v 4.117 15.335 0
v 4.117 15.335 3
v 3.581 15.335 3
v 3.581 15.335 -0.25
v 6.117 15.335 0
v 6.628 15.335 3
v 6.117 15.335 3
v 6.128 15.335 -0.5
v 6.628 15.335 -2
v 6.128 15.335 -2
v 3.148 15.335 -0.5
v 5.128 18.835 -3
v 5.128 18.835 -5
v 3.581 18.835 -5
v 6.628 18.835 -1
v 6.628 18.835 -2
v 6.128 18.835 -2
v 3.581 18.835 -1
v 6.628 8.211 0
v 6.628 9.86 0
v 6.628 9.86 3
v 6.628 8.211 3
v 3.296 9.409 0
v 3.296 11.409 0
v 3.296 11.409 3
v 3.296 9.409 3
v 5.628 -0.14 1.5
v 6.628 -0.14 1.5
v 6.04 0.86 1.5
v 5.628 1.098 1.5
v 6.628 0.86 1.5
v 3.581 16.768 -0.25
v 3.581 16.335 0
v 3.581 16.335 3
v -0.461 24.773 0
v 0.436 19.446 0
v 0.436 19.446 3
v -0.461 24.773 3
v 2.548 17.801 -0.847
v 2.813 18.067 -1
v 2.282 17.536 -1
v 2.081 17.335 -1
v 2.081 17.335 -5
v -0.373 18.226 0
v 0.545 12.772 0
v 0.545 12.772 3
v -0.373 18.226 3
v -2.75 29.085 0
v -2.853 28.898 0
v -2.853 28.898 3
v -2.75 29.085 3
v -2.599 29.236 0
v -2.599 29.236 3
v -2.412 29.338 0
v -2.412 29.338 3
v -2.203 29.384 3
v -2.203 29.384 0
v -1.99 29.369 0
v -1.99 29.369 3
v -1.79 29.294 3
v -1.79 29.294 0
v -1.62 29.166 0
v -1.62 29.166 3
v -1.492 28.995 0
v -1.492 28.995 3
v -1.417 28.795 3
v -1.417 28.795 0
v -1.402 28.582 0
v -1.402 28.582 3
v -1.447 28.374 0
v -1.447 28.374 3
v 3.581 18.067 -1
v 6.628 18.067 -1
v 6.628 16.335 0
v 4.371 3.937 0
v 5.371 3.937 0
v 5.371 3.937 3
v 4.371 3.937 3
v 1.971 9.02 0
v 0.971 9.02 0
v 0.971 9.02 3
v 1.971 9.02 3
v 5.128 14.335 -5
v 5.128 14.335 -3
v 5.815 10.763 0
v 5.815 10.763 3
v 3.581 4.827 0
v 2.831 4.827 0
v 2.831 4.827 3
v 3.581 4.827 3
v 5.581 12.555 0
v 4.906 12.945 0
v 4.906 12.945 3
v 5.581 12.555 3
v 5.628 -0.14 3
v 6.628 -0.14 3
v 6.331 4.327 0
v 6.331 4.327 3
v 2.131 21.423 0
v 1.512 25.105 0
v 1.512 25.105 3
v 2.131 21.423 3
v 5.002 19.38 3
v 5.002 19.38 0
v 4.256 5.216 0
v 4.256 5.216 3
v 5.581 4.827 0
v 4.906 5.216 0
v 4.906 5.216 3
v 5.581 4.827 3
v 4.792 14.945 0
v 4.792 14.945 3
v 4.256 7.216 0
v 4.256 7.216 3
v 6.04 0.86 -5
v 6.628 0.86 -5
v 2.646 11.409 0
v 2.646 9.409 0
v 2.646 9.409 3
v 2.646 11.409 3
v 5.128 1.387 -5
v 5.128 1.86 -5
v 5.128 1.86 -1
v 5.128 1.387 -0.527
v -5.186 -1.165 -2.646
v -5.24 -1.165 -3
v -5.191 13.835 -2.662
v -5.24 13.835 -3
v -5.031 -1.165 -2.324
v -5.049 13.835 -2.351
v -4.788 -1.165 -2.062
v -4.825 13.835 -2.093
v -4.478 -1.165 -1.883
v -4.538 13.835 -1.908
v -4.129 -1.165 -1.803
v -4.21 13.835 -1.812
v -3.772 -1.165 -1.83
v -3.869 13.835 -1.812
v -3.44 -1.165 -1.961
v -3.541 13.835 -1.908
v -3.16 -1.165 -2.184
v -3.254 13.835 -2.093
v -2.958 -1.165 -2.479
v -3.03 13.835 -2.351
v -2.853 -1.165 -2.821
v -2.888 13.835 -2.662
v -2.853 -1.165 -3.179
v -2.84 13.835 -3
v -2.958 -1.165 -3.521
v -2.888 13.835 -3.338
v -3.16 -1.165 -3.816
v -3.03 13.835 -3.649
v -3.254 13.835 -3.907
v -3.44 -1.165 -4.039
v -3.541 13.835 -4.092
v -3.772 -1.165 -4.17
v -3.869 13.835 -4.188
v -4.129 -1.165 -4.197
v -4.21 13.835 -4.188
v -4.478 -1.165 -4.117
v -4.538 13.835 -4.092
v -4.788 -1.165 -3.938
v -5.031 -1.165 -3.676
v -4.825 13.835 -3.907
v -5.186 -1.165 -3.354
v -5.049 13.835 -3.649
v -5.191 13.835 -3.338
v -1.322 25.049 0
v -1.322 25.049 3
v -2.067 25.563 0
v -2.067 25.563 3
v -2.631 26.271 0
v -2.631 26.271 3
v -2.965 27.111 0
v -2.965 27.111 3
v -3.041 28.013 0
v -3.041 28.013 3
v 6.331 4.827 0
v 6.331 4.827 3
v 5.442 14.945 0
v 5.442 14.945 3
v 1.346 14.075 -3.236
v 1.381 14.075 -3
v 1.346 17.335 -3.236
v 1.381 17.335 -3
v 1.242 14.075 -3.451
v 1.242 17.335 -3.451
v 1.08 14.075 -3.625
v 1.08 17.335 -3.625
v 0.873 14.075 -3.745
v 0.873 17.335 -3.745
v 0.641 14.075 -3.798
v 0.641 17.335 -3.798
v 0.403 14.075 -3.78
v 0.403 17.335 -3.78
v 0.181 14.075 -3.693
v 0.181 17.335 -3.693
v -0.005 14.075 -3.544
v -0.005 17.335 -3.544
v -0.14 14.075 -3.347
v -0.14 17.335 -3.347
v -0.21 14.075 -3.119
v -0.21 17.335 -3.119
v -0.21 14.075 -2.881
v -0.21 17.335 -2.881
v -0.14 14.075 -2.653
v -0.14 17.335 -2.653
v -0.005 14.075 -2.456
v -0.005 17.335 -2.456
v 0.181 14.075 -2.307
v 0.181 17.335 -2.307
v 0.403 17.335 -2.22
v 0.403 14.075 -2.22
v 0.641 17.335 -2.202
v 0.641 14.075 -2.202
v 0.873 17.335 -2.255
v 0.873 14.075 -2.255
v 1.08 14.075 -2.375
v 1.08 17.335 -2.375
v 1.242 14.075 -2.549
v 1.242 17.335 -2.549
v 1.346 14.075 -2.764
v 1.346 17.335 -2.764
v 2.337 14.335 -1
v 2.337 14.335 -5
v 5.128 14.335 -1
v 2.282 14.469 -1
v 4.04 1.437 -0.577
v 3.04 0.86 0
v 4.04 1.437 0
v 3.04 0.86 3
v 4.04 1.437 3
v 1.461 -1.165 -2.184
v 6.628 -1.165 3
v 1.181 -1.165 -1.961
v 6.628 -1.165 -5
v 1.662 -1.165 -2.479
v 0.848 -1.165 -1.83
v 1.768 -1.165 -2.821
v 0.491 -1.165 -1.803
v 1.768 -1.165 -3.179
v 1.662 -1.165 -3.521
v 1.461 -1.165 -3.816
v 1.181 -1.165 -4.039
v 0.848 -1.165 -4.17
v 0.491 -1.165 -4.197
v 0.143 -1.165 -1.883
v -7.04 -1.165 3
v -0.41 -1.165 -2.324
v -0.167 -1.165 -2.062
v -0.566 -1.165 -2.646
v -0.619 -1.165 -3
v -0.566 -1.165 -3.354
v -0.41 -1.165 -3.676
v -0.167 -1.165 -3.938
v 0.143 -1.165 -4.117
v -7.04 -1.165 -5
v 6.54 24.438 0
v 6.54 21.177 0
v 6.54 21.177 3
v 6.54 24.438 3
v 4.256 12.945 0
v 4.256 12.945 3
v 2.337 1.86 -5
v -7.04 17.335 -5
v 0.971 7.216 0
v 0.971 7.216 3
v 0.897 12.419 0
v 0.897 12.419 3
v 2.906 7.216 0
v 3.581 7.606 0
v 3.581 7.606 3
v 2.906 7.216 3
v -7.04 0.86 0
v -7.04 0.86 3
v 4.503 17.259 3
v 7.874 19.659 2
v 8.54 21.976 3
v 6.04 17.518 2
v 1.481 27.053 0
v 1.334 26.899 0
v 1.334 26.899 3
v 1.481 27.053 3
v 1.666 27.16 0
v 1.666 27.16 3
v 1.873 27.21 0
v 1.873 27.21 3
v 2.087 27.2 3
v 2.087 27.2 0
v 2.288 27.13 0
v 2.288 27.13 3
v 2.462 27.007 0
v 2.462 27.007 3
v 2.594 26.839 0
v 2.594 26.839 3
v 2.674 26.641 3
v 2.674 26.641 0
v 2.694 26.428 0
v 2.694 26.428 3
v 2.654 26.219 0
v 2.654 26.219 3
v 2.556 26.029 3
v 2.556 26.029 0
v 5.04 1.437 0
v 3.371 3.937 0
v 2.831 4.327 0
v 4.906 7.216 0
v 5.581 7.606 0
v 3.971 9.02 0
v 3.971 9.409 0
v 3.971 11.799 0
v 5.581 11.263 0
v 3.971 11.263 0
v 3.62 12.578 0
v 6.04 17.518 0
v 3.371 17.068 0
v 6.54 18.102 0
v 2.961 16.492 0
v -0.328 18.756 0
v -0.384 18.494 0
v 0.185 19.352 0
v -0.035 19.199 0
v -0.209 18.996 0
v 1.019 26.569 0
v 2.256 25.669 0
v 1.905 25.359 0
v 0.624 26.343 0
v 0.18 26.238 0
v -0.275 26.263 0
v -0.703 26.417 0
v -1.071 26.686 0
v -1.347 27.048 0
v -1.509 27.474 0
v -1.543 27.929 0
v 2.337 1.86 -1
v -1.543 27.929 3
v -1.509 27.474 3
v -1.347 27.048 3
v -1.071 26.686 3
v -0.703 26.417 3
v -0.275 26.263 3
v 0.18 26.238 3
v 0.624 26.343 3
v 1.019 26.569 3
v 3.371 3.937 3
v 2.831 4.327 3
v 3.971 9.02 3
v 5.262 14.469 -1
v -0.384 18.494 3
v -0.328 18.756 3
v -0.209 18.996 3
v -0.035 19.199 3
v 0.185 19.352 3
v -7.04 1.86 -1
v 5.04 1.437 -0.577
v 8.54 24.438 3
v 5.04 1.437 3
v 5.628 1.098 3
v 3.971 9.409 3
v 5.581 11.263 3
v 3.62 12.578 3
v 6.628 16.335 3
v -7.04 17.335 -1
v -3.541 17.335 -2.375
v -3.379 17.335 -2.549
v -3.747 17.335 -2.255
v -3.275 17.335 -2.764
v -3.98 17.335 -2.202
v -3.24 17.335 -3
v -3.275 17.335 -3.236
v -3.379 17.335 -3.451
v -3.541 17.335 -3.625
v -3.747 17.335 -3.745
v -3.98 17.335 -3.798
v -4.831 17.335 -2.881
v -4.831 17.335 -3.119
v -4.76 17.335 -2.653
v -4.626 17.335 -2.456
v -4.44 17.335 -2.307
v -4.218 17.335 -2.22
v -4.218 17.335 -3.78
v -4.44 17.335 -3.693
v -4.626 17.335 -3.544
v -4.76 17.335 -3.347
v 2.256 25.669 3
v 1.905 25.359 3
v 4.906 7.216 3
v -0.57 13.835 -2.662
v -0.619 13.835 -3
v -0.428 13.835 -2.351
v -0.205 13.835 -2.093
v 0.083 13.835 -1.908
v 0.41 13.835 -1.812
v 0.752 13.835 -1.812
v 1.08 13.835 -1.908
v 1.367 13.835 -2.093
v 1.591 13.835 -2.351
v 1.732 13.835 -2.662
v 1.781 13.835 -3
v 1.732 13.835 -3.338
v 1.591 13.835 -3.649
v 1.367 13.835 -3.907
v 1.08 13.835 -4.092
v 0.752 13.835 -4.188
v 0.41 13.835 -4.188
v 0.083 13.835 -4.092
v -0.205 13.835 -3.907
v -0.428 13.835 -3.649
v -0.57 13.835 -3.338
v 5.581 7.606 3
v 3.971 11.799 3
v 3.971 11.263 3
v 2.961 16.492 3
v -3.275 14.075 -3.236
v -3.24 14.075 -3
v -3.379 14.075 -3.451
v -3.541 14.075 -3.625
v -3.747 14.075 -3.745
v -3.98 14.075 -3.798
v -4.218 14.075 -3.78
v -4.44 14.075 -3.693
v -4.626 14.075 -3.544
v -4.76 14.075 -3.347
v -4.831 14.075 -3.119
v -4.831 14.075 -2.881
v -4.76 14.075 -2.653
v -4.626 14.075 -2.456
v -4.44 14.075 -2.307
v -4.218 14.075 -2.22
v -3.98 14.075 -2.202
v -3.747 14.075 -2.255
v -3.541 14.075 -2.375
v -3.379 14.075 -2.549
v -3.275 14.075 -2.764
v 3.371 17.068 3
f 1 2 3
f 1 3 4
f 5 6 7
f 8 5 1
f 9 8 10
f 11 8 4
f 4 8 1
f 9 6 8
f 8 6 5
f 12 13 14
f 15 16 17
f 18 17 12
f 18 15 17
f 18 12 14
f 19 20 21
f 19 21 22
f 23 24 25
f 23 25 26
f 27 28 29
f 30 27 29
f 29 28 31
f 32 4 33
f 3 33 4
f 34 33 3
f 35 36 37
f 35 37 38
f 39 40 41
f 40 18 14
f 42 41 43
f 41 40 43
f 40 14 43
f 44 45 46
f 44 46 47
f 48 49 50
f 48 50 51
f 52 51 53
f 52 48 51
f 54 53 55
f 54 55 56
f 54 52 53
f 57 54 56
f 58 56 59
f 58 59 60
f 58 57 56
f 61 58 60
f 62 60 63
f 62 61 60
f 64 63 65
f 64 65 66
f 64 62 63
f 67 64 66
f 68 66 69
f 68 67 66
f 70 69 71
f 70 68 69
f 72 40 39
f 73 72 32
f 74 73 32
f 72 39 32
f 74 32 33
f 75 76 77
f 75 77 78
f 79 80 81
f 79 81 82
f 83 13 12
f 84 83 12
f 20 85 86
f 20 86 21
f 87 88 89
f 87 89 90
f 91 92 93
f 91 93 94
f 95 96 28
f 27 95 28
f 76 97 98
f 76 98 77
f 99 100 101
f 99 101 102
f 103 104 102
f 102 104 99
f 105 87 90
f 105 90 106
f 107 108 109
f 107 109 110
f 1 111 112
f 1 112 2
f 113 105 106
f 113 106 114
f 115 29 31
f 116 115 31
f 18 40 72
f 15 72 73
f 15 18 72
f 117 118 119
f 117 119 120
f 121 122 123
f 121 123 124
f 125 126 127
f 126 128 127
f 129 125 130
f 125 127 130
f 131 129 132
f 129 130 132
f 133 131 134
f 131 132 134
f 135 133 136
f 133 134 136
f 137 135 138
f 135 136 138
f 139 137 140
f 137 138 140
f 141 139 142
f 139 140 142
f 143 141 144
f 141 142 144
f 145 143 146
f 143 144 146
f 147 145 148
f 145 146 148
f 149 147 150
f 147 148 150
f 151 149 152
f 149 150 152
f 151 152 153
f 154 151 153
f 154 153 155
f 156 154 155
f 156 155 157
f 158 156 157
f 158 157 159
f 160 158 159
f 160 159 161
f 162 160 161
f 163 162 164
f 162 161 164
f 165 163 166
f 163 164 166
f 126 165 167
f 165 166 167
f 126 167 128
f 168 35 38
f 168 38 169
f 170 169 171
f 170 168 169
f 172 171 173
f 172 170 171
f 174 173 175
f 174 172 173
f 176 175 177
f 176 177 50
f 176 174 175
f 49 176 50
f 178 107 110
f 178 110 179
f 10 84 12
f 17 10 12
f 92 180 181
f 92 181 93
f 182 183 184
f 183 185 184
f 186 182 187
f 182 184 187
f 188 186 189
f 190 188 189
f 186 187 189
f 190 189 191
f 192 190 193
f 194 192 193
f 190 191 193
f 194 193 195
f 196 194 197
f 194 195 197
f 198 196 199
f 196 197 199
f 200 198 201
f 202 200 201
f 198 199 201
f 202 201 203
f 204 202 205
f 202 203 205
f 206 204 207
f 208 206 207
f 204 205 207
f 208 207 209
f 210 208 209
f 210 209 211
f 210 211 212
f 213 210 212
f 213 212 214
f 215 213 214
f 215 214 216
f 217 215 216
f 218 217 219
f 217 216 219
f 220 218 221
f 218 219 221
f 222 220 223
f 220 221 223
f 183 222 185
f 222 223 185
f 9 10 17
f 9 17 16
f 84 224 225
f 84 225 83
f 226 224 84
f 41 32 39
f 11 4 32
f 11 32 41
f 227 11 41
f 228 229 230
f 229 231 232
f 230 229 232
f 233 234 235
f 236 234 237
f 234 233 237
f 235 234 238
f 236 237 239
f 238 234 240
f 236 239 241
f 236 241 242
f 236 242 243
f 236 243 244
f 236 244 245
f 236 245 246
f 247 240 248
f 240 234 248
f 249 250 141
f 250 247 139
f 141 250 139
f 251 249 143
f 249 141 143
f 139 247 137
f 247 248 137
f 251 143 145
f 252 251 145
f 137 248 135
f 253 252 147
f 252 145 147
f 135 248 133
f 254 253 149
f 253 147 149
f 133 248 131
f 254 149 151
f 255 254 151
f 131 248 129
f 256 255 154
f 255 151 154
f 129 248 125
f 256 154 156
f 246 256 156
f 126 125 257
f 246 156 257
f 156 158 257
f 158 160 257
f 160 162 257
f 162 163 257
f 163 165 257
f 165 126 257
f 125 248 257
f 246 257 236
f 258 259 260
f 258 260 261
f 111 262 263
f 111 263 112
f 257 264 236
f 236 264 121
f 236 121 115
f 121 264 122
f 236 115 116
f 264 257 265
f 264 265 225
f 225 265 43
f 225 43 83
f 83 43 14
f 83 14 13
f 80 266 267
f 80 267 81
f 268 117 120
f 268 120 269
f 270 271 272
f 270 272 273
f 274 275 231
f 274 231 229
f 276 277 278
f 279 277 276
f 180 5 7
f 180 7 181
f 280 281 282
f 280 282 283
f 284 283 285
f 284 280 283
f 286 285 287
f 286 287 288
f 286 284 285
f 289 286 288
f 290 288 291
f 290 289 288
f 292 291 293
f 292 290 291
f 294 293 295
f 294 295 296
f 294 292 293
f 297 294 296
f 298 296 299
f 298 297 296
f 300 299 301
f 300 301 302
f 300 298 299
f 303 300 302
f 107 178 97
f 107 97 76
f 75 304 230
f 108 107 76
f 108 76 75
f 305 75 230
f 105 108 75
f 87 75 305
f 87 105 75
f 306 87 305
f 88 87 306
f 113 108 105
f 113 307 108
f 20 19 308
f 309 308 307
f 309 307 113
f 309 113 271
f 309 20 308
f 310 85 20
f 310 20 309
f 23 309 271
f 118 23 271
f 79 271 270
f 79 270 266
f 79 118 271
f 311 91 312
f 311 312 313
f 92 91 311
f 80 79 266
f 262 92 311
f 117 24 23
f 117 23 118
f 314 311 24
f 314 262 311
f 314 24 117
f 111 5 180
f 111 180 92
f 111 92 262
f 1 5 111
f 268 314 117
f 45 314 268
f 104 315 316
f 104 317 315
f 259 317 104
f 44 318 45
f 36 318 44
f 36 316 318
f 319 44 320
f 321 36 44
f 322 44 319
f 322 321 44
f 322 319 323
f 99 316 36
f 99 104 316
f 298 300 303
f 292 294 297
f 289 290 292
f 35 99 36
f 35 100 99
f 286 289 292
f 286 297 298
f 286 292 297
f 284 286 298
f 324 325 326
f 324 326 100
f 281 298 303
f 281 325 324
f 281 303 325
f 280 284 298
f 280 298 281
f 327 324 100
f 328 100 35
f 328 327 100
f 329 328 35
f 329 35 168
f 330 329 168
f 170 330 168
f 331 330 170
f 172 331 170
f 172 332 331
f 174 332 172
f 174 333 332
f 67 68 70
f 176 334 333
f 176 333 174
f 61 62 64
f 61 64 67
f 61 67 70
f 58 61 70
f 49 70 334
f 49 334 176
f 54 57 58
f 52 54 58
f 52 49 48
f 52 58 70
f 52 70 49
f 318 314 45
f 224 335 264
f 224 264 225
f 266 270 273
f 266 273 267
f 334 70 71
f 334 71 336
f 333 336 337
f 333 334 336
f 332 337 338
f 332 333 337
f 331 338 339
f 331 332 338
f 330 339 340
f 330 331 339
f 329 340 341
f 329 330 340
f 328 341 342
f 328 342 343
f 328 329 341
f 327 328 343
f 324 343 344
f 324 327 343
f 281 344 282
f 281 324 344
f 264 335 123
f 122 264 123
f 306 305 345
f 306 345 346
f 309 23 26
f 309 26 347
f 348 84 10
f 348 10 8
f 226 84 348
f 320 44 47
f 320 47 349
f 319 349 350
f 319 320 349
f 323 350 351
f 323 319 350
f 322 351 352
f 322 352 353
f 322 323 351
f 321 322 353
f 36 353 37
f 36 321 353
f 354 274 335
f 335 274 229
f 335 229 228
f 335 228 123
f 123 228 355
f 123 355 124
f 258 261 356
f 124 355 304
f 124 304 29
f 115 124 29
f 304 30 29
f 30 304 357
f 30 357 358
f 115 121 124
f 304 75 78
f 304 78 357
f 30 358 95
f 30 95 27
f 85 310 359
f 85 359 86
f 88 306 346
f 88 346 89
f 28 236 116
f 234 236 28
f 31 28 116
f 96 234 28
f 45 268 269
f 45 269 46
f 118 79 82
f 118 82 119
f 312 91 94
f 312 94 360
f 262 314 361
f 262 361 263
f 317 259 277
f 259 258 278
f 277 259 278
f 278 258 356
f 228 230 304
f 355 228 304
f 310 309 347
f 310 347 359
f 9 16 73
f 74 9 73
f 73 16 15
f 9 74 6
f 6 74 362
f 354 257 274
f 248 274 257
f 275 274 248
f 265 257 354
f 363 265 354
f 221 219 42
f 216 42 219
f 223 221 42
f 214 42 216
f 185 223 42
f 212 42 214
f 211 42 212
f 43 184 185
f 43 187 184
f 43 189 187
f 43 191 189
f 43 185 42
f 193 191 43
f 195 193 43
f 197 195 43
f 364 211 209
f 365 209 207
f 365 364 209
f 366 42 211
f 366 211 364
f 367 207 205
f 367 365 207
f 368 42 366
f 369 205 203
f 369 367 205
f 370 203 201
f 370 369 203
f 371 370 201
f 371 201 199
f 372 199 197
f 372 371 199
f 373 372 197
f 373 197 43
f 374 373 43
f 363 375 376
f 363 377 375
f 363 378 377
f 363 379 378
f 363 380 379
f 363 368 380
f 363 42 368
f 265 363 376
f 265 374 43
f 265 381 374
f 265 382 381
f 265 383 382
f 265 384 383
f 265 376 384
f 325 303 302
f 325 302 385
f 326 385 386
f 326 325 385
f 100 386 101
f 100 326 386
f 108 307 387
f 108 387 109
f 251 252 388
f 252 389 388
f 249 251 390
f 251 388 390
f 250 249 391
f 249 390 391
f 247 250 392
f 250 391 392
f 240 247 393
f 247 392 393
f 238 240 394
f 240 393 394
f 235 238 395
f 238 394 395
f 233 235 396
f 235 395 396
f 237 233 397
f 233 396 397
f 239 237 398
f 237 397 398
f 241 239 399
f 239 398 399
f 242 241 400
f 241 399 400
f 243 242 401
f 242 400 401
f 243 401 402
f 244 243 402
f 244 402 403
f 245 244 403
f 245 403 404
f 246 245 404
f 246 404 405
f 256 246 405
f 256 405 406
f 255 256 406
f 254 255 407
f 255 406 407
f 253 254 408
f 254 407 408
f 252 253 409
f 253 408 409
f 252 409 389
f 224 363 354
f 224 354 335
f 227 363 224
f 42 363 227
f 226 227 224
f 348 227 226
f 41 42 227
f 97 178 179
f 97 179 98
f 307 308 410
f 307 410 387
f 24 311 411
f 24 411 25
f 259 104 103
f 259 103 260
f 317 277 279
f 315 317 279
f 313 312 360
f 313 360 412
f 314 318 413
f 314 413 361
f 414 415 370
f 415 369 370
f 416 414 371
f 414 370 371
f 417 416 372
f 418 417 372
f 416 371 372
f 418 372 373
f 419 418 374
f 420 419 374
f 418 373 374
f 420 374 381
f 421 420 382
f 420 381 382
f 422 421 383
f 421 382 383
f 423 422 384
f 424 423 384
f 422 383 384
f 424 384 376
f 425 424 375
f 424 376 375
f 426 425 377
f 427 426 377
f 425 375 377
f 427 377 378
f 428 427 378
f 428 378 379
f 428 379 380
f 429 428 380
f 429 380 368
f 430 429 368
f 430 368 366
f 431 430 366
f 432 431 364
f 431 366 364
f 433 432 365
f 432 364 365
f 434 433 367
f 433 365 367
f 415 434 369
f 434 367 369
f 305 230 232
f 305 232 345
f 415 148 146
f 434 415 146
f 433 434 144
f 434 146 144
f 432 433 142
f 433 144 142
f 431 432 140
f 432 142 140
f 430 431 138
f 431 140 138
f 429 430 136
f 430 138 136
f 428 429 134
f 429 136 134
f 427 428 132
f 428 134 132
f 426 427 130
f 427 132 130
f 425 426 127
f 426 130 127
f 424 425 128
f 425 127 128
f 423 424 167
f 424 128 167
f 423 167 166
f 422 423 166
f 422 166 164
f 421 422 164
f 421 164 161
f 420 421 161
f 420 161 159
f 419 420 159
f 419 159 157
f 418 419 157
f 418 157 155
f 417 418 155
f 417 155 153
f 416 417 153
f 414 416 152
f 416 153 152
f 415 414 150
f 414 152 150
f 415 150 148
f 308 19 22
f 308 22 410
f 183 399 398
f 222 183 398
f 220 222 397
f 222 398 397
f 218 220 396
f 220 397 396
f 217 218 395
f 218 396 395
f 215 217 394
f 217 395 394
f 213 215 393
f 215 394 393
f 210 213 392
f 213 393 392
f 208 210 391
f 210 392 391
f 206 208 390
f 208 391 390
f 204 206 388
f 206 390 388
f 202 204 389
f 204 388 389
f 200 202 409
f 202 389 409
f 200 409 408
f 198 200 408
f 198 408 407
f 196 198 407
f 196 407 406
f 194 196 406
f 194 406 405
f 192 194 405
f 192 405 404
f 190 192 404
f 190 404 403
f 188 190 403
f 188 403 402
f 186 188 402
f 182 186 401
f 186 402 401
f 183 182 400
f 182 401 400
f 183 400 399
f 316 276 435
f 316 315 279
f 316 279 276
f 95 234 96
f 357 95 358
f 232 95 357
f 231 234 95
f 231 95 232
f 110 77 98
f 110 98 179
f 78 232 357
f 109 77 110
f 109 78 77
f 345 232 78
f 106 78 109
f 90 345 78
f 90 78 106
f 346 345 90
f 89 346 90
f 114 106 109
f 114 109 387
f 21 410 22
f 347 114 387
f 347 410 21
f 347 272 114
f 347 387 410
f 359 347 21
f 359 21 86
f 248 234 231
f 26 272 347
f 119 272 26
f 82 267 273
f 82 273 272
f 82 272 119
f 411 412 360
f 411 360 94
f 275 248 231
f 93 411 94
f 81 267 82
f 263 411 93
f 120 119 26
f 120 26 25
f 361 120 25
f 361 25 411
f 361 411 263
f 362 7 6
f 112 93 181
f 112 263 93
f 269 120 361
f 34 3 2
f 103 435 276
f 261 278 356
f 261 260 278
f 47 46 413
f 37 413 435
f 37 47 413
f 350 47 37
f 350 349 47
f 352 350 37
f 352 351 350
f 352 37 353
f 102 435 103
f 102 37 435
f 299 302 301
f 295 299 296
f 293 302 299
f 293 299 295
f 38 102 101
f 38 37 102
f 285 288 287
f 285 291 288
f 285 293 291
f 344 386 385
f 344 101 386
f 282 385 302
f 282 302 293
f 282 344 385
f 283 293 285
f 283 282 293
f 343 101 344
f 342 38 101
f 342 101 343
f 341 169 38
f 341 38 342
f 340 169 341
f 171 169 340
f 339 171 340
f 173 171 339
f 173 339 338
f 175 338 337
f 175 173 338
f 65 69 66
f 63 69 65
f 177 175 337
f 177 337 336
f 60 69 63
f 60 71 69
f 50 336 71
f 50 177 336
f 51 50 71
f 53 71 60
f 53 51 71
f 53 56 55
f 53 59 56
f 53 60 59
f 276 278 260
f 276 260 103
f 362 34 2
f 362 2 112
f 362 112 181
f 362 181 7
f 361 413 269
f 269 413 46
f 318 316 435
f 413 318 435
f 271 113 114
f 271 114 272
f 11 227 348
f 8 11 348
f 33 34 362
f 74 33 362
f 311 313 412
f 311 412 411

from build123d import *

# Parameters (mm, degrees)
BOSS_SWITCH_BODY_DEPTH                         = 3
SKETCH1_W                                      = 4
SKETCH1_H                                      = 3.5
BOSS_FLANGE_WIDTH_DEPTH                        = 5
BOSS_FLANGE_HEIGHT_REACH                       = 38.166
SKETCH2_W                                      = 4
SKETCH2_H                                      = 2
SKETCH2_W_2                                    = 8
SKETCH2_H_2                                    = 2.024978658
CUT_UP_TO_DOWN_DERAILLEUR_CLEARANCE_REACH      = 23.862
SKETCH10_W                                     = 2.453096586
SKETCH10_H                                     = 3
SKETCH17_W                                     = 12.1675
SKETCH17_H                                     = 4
BOSS_FLANGE_SUPPORT_DEPTH                      = 14.475021342
TAP_DRILL_FOR_M2X0_4_TAP1_D                    = 1.6
M2_CLEARANCE_HOLE2_D                           = 2.4
M2_CLEARANCE_HOLE2_DEPTH                       = 15
M2_CLEARANCE_HOLE2_TIP                         = 0.721032743
CUT_UP_TO_DOWN_CANTILEVER_SLOPE_REACH          = 31.347
CUT_DOWN_TO_UP_DERAILLEUR_CLEARANCE_DEPTH      = 33.698678667
CUT_DOWN_TO_UP_DERAILLEUR_CLEARANCE_DEPTH_BACK = 33.698678667
CHAMFER_FLANGE_SUPPORT_SIZE                    = 1.5
CHAMFER_FLANGE_SUPPORT_2_SIZE                  = 1
CHAMFER_FLANGE_SUPPORT_3_SIZE                  = 1
SKETCH18_W                                     = 1.5
SKETCH18_H                                     = 1.577331094
CUT_DOWN_TO_UP_DERAILLEUR_CLEARANCE_2_DEPTH    = 1
SKETCH19_W                                     = 3.046903414
SKETCH19_H                                     = 2.563581512
CUT_UP_TO_DOWN_CANTILEVER_CLEARANCE_DEPTH      = 1
CHAMFER1_SIZE                                  = 1
CHAMFER1_SIZE_2                                = 1.732050808
CHAMFER3_SIZE                                  = 0.75
CHAMFER3_SIZE_2                                = 1.299038106
CHAMFER4_SIZE                                  = 0.5
CHAMFER4_SIZE2                                 = 0.866025404
CHAMFER5_SIZE                                  = 0.5
CHAMFER6_SIZE                                  = 2.5
CHAMFER7_SIZE                                  = 1
CUT_EXTRUDE3_REACH                             = 33.008
SKETCH23_W                                     = 2.791062273
SKETCH23_H                                     = 12.475021342
CUT_GAP_FOR_PRINTING_DEPTH                     = 31.862053717


# Some blends are built 0.0001 mm under size
with BuildPart() as part:
    # Sketch-SwitchBossUp → Boss-Switch Body (new body)
    with BuildSketch(Plane.XY):
        with BuildLine():
            Line((6.540476927, 21.177422148), (6.540476927, 24.438379064))
            Line((6.540476927, 24.438379064), (8.540476927, 24.438379064))
            Line((8.540476927, 24.438379064), (8.540476927, 20.438379064))
            Line((8.540476927, 20.438379064), (6.040476927, 17.517528279))
            Line((6.040476927, 17.517528279), (2.878366495, 16.985217616))
            Line((2.878366495, 16.985217616), (3.620297651, 12.577888564))
            Line((3.620297651, 12.577888564), (4.256080915, 12.944958203))
            Line((4.256080915, 12.944958203), (4.791964496, 14.944962169))
            Line((4.791964496, 14.944962169), (4.116925685, 15.334689347))
            Line((4.116925685, 15.334689347), (3.581073513, 15.334689347))
            Line((3.581073513, 15.334689347), (3.581073513, 16.334689347))
            Line((3.581073513, 16.334689347), (6.857327822, 16.334689347))
            Line((6.857327822, 16.334689347), (13.441613484, 16.334689347))
            Line((13.441613484, 16.334689347), (13.441613484, -1.165310653))
            Line((13.441613484, -1.165310653), (5.040476927, -1.165310653))
            Line((5.040476927, -1.165310653), (3.040476927, -1.165310653))
            Line((3.040476927, -1.165310653), (3.040476927, 0.859668005))
            Line((3.040476927, 0.859668005), (4.040476927, 1.437018274))
            Line((4.040476927, 1.437018274), (3.370603946, 3.937018274))
            Line((3.370603946, 3.937018274), (2.83114552, 4.326720436))
            Line((2.83114552, 4.326720436), (2.83114552, 4.826720436))
            Line((2.83114552, 4.826720436), (3.58114552, 4.826720436))
            Line((3.58114552, 4.826720436), (4.256138119, 5.216427595))
            Line((4.256138119, 5.216427595), (4.256138119, 7.216427595))
            Line((4.256138119, 7.216427595), (3.581130717, 7.6061433))
            Line((3.581130717, 7.6061433), (2.9061262, 7.216422599))
            Line((2.9061262, 7.216422599), (0.971281627, 7.216422599))
            Line((0.971281627, 7.216422599), (0.971281627, 9.019692757))
            Line((0.971281627, 9.019692757), (1.971281627, 9.019692757))
            Line((1.971281627, 9.019692757), (2.646271341, 9.40939825))
            Line((2.646271341, 9.40939825), (2.646271341, 11.40939825))
            Line((2.646271341, 11.40939825), (0.897326855, 12.41915182))
            Line((0.897326855, 12.41915182), (0.545466745, 12.771663724))
            Line((0.545466745, 12.771663724), (-0.372784255, 18.226393961))
            ThreePointArc((-0.372784255, 18.226393961), (-0.209313172, 18.996084896), (0.435897335, 19.446473985))
            Line((0.435897335, 19.446473985), (-0.46073685, 24.772792819))
            ThreePointArc((-0.46073685, 24.772792819), (-2.630501593, 26.270619745), (-2.852546321, 28.897797067))
            ThreePointArc((-2.852546321, 28.897797067), (-1.887813913, 29.338582026), (-1.447028953, 28.373849618))
            ThreePointArc((-1.447028953, 28.373849618), (-0.703448682, 26.416936722), (1.333779254, 26.898727173))
            ThreePointArc((1.333779254, 26.898727173), (2.379722745, 27.074801628), (2.555797201, 26.028858137))
            ThreePointArc((2.555797201, 26.028858137), (2.086504637, 25.507104397), (1.511513111, 25.104801997))
            Line((1.511513111, 25.104801997), (2.546357317, 18.957467576))
            Line((2.546357317, 18.957467576), (4.992893704, 19.36931828))
            Line((4.992893704, 19.36931828), (6.540476927, 21.177422148))
        make_face()
        Polygon((5.581091201, 12.555245643), (5.581100766, 11.263016278), (3.971265023, 11.263016278), (3.97126394, 11.79911022), (3.296271341, 11.409403061), (3.296271341, 9.409403061), (3.971278743, 9.019687356), (3.971278743, 9.409408058), (5.815189335, 10.763016278), (6.627976927, 9.860324206), (6.627976927, 8.210536506), (5.581127833, 7.606137899), (4.906138119, 7.216432406), (4.906138119, 5.216432406), (5.58114552, 4.826716701), (6.33114552, 4.826716701), (6.33114552, 4.326716701), (5.370603946, 3.937018274), (4.370603946, 3.937018274), (5.040476927, 1.437018274), (6.040487998, 0.85968718), (9.127976927, 0.85968718), (10.437466736, 2.169176988), (10.437466736, 14.025199539), (9.127976927, 15.334689347), (6.116971898, 15.334689347), (5.441964496, 14.94496698), (4.906080915, 12.944963014), align=None, mode=Mode.SUBTRACT)
    extrude(amount=BOSS_SWITCH_BODY_DEPTH)

    # Sketch1 → Boss-Flange Width (add)
    with BuildSketch(Plane(origin=(0, 0, 0), x_dir=(-1, 0, 0), z_dir=(0, 0, -1))):
        Polygon((-7.581073513, -1.165310653), (0.412170615, -1.165310653), (0.412170615, 0.859668005), (-3.040476927, 0.859668005), (-4.040476927, 1.437018274), (-5.040476927, 1.437018274), (-6.040487998, 0.85968718), (-7.581073513, 0.85968718), align=None)
        with Locations((-5.581073513, 17.084689347)):
            Rectangle(SKETCH1_W, SKETCH1_H)
    extrude(amount=BOSS_FLANGE_WIDTH_DEPTH)

    # Sketch2 → Boss-Flange Height (add, up to next)
    with BuildSketch(Plane(origin=(-7.039523073, 0, 0), x_dir=(0, 0, -1), z_dir=(1, 0, 0)), mode=Mode.PRIVATE) as boss_flange_height_sk1:
        with Locations((3, 16.334689347)):
            Rectangle(SKETCH2_W, SKETCH2_H)
    boss_flange_height_tool1 = extrude(boss_flange_height_sk1.sketch, amount=BOSS_FLANGE_HEIGHT_REACH, mode=Mode.PRIVATE) - part.part
    # Sketch2 → Boss-Flange Height (add, up to next)
    with BuildSketch(Plane(origin=(-7.039523073, 0, 0), x_dir=(0, 0, -1), z_dir=(1, 0, 0)), mode=Mode.PRIVATE) as boss_flange_height_sk2:
        with Locations((1, -0.152821324)):
            Rectangle(SKETCH2_W_2, SKETCH2_H_2)
    boss_flange_height_tool2 = extrude(boss_flange_height_sk2.sketch, amount=BOSS_FLANGE_HEIGHT_REACH, mode=Mode.PRIVATE) - part.part
    add(boss_flange_height_tool1.solids().sort_by_distance((-7.039523, 16.334689, -3))[0])
    add(boss_flange_height_tool2.solids().sort_by_distance((-7.039523, -0.152821, -1))[0])

    # Sketch10 → Cut-Up-To-Down Derailleur Clearance (cut, up to next)
    with BuildSketch(Plane(origin=(0, 15.334689347, 0), x_dir=(1, 0, 0), z_dir=(0, 1, 0)), mode=Mode.PRIVATE) as cut_up_to_down_derailleur_clearance_sk1:
        with Locations((6.35452522, 3.5)):
            Rectangle(SKETCH10_W, SKETCH10_H)
    cut_up_to_down_derailleur_clearance_tool1 = extrude(cut_up_to_down_derailleur_clearance_sk1.sketch, amount=CUT_UP_TO_DOWN_DERAILLEUR_CLEARANCE_REACH, mode=Mode.PRIVATE) & part.part
    add(cut_up_to_down_derailleur_clearance_tool1.solids().sort_by_distance((6.354525, 15.334689, -3.5))[0], mode=Mode.SUBTRACT)

    # Sketch17 → Boss-Flange Support (add)
    with BuildSketch(Plane.XZ.offset(-15.334689347)):
        with Locations((-0.955773073, -3)):
            Rectangle(SKETCH17_W, SKETCH17_H)
    extrude(amount=BOSS_FLANGE_SUPPORT_DEPTH)

    # Tap Drill for M2x0.4 Tap1 (through all)
    with Locations(Plane(origin=(0, -1.165310653, 0), x_dir=(-1, 0, 0), z_dir=(0, -1, 0))):
        with Locations((4.039523073, 3), (-0.581073513, 3)):
            Hole(TAP_DRILL_FOR_M2X0_4_TAP1_D / 2)

    # M2 Clearance Hole2
    with Locations(Plane.XZ.offset(1.165310653)):
        with Locations((-4.039523073, -3), (0.581073513, -3)):
            Hole(M2_CLEARANCE_HOLE2_D / 2, depth=M2_CLEARANCE_HOLE2_DEPTH)
            with Locations((0, 0, -(M2_CLEARANCE_HOLE2_DEPTH + M2_CLEARANCE_HOLE2_TIP / 2))):  # 118° drill point
                Cone(0, M2_CLEARANCE_HOLE2_D / 2, M2_CLEARANCE_HOLE2_TIP, mode=Mode.SUBTRACT)

    # Sketch12 → Cut-Up-to-Down Cantilever Slope (cut, up to next)
    with BuildSketch(Plane(origin=(0, 24.438379064, 0), x_dir=(1, 0, 0), z_dir=(0, 1, 0)), mode=Mode.PRIVATE) as cut_up_to_down_cantilever_slope_sk1:
        Polygon((6.540476927, 0), (8.540476927, -3), (8.540476927, 0), align=None)
    cut_up_to_down_cantilever_slope_tool1 = extrude(cut_up_to_down_cantilever_slope_sk1.sketch, amount=-CUT_UP_TO_DOWN_CANTILEVER_SLOPE_REACH, mode=Mode.PRIVATE) & part.part
    add(cut_up_to_down_cantilever_slope_tool1.solids().sort_by_distance((7.87381, 24.438379, 1))[0], mode=Mode.SUBTRACT)

    # Sketch16 → Cut-Down-to-Up Derailleur Clearance (cut, two sides: drawn at the far end of the back side and taken through both)
    with BuildSketch(Plane(origin=(0, 0, 0), x_dir=(-1, 0, 0), z_dir=(0, 0, -1)).offset(-CUT_DOWN_TO_UP_DERAILLEUR_CLEARANCE_DEPTH_BACK)):
        Polygon((-7.581073513, 18.834689347), (-13.441613484, 18.834689347), (-13.441613484, -1.165310653), (-6.627976927, -1.165310653), (-6.627976927, 5.203794929), (-8.003689255, 5.203794929), (-8.003689255, 12.048417413), (-6.627976927, 12.048417413), (-6.627976927, 17.947659965), align=None)
    extrude(amount=CUT_DOWN_TO_UP_DERAILLEUR_CLEARANCE_DEPTH + CUT_DOWN_TO_UP_DERAILLEUR_CLEARANCE_DEPTH_BACK, mode=Mode.SUBTRACT)

    # Chamfer-Flange Support
    chamfer_flange_support_edges = [part.edges().sort_by_distance(p)[0] for p in [
        (3.581073513, 17.334689347, -3),
    ]]
    chamfer(chamfer_flange_support_edges, length=CHAMFER_FLANGE_SUPPORT_SIZE - 0.0001)  # a hair under: the kernel refuses the full size

    # Chamfer-Flange Support 2
    chamfer_flange_support_2_edges = [part.edges().sort_by_distance(p)[0] for p in [
        (5.127976927, 17.084689347, -2),
        (5.127976927, 15.334689347, -1.5),
    ]]
    chamfer(chamfer_flange_support_2_edges, length=CHAMFER_FLANGE_SUPPORT_2_SIZE)

    # Chamfer-Flange Support 3
    chamfer_flange_support_3_edges = [part.edges().sort_by_distance(p)[0] for p in [
        (-1.999523073, 0.859668005, -1),
    ]]
    chamfer(chamfer_flange_support_3_edges, length=CHAMFER_FLANGE_SUPPORT_3_SIZE)

    # Sketch18 → Cut-Down-to-Up Derailleur Clearance 2 (cut)
    with BuildSketch(Plane(origin=(6.627976927, 0, 0), x_dir=(0, 0, -1), z_dir=(1, 0, 0))):
        with Locations((-2.25, 0.648352727)):
            Rectangle(SKETCH18_W, SKETCH18_H)
    extrude(amount=-CUT_DOWN_TO_UP_DERAILLEUR_CLEARANCE_2_DEPTH, mode=Mode.SUBTRACT)

    # Sketch19 → Cut-Up-to-Down Cantilever Clearance (cut)
    with BuildSketch(Plane.XY):
        with Locations((5.10452522, 17.616480103)):
            Rectangle(SKETCH19_W, SKETCH19_H)
    extrude(amount=-CUT_UP_TO_DOWN_CANTILEVER_CLEARANCE_DEPTH, mode=Mode.SUBTRACT)

    # Chamfer1
    # the kernel refuses this chamfer: 1.732050808, 1 mm, written as the material it adds along each edge
    with BuildSketch(Plane(origin=(6.627976927, 16.334689347, -1), x_dir=(0, -0.05789386240266977, 0.9983227437537926), z_dir=(-1, 0, 0))) as chamfer1_piece_1:
        Polygon((CHAMFER1_SIZE * 0.998322743754, CHAMFER1_SIZE * 0.0578938624027), (-CHAMFER1_SIZE_2 * 0.0578938623883, CHAMFER1_SIZE_2 * 0.998322743505), (0, 0), align=None)
    extrude(amount=3.046903414)

    # Chamfer3
    # the kernel refuses this chamfer: 1.299038106, 0.75 mm, written as the material it adds along each edge
    with BuildSketch(Plane(origin=(3.581073513, 15.334689347, -1), x_dir=(0.05789386240236086, -1.5934376059306423e-13, 0.9983227437538106), z_dir=(0, 1, 0))) as chamfer3_piece_1_section:
        Polygon((CHAMFER3_SIZE * 0.998322743754, -CHAMFER3_SIZE * 0.0578938624027), (-CHAMFER3_SIZE_2 * 0.057893862388, -CHAMFER3_SIZE_2 * 0.998322743505), (0, 0), align=None)
    chamfer3_piece_1 = extrude(amount=6.092773786, mode=Mode.PRIVATE)
    chamfer3_piece_1 = split(chamfer3_piece_1, bisect_by=Plane(origin=(3.127107762, 16.799062109, -0.268105739), z_dir=(0, -0.4999999999999566, -0.8660254037844637)), keep=Keep.TOP, mode=Mode.PRIVATE)
    chamfer3_piece_1 = split(chamfer3_piece_1, bisect_by=Plane(origin=(2.18713947, 17.440655304, -0.784906566), z_dir=(0.7071067811865476, -0.7071067811865476, 0)), keep=Keep.TOP, mode=Mode.PRIVATE)
    add(chamfer3_piece_1)

    # Chamfer4
    chamfer4_edges = [part.edges().sort_by_distance(p)[0] for p in [
        (4.205006167, 15.334689347, -1),
    ]]
    chamfer4_side = [part.faces().sort_by_distance(p)[0] for p in [
        (2.964678171, 15.334689347, -0.682371949),
    ]]
    chamfer(chamfer4_edges, length=CHAMFER4_SIZE, length2=CHAMFER4_SIZE2, reference=chamfer4_side[0])

    # Chamfer5
    chamfer5_edges = [part.edges().sort_by_distance(p)[0] for p in [
        (2.878366495, 16.985217616, 1.5),
    ]]
    chamfer(chamfer5_edges, length=CHAMFER5_SIZE)

    # Chamfer6
    # the kernel refuses this chamfer: 2.5 mm, written as the material it adds along each edge
    with BuildSketch(Plane(origin=(2.546357317, 18.957467576, 0), x_dir=(0.9903165846799726, 0.13882745444541758, 0), z_dir=(0, 0, 1))) as chamfer6_piece_1:
        Polygon((CHAMFER6_SIZE * 0.999621916911, CHAMFER6_SIZE * 0.0274958766106), (-CHAMFER6_SIZE * 0.0274958766106, CHAMFER6_SIZE * 0.999621916911), (0, 0), align=None)
    extrude(amount=3)

    # Chamfer7
    chamfer7_edges = [part.edges().sort_by_distance(p)[0] for p in [
        (7.290476927, 18.977953671, 3),
    ]]
    chamfer(chamfer7_edges, length=CHAMFER7_SIZE)

    # Sketch22 → Cut-Extrude3 (cut, up to next)
    with BuildSketch(Plane.XY, mode=Mode.PRIVATE) as cut_extrude3_sk1:
        Polygon((6.627976927, 17.947659965), (7.581073513, 18.834689347), (6.627976927, 18.834689347), align=None)
    cut_extrude3_tool1 = extrude(cut_extrude3_sk1.sketch, amount=-CUT_EXTRUDE3_REACH, mode=Mode.PRIVATE) & part.part
    add(cut_extrude3_tool1.solids().sort_by_distance((6.945676, 18.539013, 0))[0], mode=Mode.SUBTRACT)

    # Sketch23 → Cut-Gap for Printing (cut, through all)
    with BuildSketch(Plane.XY.offset(-1)):
        with Locations((3.732445791, 8.097178676)):
            Rectangle(SKETCH23_W, SKETCH23_H)
    extrude(amount=-CUT_GAP_FOR_PRINTING_DEPTH, mode=Mode.SUBTRACT)


solid = part.part
